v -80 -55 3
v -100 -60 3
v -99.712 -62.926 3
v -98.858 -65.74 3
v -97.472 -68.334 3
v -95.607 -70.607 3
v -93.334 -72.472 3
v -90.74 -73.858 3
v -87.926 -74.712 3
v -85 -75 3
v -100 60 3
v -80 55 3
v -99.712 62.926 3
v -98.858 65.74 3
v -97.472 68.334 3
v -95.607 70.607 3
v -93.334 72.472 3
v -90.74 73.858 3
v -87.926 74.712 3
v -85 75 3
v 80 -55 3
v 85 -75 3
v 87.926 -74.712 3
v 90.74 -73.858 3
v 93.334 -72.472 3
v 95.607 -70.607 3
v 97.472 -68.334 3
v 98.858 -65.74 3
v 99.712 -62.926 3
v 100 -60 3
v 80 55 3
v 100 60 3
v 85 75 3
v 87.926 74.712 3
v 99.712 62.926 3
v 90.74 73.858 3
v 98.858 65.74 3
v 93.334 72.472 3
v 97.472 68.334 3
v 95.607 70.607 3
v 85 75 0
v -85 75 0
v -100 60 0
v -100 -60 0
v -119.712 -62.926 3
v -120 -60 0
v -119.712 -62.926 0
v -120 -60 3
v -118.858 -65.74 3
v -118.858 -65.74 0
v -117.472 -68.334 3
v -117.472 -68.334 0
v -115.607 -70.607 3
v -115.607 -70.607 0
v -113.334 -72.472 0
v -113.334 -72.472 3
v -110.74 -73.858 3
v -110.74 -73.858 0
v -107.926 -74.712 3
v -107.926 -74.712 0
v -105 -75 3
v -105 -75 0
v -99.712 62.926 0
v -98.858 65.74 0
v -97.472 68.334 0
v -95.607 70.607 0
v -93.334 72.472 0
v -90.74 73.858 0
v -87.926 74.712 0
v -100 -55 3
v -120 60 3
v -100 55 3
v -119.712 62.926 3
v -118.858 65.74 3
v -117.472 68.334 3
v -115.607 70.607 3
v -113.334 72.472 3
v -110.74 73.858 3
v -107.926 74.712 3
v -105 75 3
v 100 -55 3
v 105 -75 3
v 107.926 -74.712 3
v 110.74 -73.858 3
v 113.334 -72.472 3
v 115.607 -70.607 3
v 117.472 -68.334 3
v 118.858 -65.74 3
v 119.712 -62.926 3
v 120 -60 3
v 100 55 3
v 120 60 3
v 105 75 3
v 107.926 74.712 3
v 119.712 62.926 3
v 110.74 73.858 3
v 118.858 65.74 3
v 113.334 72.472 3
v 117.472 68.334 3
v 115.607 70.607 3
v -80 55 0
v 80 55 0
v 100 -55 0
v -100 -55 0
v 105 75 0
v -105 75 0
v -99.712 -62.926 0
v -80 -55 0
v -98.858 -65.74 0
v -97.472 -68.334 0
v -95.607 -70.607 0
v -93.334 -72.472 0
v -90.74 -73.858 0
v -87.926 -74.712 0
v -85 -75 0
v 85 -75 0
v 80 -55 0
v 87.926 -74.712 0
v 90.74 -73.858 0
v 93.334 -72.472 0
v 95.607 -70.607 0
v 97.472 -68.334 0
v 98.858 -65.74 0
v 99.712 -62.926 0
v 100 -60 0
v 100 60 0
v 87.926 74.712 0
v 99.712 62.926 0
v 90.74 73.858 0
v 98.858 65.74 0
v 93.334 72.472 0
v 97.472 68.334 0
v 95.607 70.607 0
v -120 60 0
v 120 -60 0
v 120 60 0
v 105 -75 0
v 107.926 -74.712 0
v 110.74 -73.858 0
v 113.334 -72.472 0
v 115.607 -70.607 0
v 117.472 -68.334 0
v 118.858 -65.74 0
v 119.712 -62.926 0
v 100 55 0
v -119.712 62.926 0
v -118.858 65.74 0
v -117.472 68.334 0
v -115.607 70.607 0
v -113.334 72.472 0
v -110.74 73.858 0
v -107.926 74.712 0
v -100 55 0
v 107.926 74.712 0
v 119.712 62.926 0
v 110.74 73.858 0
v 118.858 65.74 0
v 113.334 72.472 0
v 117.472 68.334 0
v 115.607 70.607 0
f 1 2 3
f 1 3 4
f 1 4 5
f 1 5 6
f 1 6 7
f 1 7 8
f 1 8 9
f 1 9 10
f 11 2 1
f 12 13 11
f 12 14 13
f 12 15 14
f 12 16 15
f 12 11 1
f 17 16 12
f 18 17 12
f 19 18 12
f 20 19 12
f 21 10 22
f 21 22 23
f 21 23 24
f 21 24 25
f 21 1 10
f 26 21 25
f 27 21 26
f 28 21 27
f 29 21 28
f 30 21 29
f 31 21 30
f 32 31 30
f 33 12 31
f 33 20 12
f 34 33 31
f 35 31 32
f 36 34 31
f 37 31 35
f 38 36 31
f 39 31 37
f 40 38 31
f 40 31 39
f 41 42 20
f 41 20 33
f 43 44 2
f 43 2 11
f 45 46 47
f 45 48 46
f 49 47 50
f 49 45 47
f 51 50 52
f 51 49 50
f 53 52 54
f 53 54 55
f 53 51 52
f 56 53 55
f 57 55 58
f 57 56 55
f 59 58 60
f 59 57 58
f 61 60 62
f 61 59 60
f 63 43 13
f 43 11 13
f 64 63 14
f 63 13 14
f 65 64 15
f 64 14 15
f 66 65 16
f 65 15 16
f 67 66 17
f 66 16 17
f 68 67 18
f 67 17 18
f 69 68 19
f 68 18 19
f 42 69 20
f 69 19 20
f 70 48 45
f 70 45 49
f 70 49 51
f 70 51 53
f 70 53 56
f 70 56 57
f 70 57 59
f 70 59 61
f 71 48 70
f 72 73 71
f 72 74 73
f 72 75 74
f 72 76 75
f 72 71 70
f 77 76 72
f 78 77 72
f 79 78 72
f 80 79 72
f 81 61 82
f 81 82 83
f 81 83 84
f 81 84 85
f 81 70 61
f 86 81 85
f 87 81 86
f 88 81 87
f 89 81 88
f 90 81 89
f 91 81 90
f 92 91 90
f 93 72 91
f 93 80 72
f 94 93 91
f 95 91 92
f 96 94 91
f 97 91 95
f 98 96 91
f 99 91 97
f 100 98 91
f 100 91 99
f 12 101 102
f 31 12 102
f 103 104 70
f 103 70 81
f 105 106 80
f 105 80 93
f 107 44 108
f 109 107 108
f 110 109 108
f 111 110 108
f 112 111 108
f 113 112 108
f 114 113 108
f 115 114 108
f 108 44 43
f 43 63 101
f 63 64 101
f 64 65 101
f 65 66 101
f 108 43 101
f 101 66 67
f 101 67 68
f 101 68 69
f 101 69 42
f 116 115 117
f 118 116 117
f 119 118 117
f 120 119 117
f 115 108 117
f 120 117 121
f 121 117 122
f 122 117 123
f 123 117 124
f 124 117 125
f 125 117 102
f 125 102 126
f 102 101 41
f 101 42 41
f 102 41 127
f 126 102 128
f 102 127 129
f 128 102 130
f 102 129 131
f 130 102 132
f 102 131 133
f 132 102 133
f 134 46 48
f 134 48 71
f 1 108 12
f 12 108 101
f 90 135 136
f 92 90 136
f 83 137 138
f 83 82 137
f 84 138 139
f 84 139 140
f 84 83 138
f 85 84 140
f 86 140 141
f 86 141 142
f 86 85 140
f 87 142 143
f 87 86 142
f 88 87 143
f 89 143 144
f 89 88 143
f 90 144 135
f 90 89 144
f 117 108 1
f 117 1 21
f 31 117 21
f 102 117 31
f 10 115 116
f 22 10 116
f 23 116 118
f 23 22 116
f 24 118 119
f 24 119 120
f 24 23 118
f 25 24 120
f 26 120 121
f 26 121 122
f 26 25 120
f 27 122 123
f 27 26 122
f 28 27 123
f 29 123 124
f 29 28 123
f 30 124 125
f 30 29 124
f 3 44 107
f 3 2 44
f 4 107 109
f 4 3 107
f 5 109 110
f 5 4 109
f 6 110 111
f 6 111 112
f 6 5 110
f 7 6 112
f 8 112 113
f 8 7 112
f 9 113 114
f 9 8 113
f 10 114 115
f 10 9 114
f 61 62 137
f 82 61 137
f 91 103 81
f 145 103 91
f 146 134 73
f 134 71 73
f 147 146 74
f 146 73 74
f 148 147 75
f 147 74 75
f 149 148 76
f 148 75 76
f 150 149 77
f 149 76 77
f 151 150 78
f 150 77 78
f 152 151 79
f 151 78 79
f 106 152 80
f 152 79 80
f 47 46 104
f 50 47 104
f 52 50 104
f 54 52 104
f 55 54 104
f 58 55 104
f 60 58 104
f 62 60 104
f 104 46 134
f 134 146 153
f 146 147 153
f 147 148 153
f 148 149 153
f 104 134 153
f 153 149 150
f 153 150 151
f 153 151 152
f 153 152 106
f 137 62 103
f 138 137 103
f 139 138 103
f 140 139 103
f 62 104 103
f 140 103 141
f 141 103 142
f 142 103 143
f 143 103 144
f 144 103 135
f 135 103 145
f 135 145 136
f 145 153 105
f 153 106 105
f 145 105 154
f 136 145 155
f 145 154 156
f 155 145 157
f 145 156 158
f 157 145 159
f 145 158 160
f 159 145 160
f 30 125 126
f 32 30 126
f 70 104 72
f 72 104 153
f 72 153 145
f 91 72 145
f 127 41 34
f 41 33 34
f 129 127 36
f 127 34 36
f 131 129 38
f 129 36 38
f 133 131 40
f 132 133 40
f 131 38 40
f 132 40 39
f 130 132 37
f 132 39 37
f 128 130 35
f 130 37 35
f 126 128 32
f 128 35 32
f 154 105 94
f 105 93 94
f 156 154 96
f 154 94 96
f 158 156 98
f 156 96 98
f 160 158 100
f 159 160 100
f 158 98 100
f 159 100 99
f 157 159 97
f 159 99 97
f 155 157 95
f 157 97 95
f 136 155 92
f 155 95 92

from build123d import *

# Parameters (mm, degrees)
F0_W     = 200
F0_H     = 150
F0_W_2   = 160
F0_H_2   = 110
F1_DEPTH = 3
F2_R     = 15
F3_W     = 240
F3_H     = 150
F3_W_2   = 200
F3_H_2   = 110
F4_DEPTH = 3
F5_R     = 15


with BuildPart() as f1:
    # F0 (on Top) → F1 (new body)
    with BuildSketch(Plane.XY):
        Rectangle(F0_W, F0_H)
        Rectangle(F0_W_2, F0_H_2, mode=Mode.SUBTRACT)
    extrude(amount=F1_DEPTH)

    # F2
    f2_edges = [f1.edges().sort_by_distance(p)[0] for p in [
        (-100, 75, 1.5),
        (100, 75, 1.5),
        (100, -75, 1.5),
        (-100, -75, 1.5),
    ]]
    fillet(f2_edges, radius=F2_R)


with BuildPart() as f4:
    # F3 (on Top) → F4 (new body)
    with BuildSketch(Plane.XY):
        Rectangle(F3_W, F3_H)
        Rectangle(F3_W_2, F3_H_2, mode=Mode.SUBTRACT)
    extrude(amount=F4_DEPTH)

    # F5
    f5_edges = [f4.edges().sort_by_distance(p)[0] for p in [
        (-120, 75, 1.5),
        (-120, -75, 1.5),
        (120, -75, 1.5),
        (120, 75, 1.5),
    ]]
    fillet(f5_edges, radius=F5_R)


solid = Compound([f1.part, f4.part])
